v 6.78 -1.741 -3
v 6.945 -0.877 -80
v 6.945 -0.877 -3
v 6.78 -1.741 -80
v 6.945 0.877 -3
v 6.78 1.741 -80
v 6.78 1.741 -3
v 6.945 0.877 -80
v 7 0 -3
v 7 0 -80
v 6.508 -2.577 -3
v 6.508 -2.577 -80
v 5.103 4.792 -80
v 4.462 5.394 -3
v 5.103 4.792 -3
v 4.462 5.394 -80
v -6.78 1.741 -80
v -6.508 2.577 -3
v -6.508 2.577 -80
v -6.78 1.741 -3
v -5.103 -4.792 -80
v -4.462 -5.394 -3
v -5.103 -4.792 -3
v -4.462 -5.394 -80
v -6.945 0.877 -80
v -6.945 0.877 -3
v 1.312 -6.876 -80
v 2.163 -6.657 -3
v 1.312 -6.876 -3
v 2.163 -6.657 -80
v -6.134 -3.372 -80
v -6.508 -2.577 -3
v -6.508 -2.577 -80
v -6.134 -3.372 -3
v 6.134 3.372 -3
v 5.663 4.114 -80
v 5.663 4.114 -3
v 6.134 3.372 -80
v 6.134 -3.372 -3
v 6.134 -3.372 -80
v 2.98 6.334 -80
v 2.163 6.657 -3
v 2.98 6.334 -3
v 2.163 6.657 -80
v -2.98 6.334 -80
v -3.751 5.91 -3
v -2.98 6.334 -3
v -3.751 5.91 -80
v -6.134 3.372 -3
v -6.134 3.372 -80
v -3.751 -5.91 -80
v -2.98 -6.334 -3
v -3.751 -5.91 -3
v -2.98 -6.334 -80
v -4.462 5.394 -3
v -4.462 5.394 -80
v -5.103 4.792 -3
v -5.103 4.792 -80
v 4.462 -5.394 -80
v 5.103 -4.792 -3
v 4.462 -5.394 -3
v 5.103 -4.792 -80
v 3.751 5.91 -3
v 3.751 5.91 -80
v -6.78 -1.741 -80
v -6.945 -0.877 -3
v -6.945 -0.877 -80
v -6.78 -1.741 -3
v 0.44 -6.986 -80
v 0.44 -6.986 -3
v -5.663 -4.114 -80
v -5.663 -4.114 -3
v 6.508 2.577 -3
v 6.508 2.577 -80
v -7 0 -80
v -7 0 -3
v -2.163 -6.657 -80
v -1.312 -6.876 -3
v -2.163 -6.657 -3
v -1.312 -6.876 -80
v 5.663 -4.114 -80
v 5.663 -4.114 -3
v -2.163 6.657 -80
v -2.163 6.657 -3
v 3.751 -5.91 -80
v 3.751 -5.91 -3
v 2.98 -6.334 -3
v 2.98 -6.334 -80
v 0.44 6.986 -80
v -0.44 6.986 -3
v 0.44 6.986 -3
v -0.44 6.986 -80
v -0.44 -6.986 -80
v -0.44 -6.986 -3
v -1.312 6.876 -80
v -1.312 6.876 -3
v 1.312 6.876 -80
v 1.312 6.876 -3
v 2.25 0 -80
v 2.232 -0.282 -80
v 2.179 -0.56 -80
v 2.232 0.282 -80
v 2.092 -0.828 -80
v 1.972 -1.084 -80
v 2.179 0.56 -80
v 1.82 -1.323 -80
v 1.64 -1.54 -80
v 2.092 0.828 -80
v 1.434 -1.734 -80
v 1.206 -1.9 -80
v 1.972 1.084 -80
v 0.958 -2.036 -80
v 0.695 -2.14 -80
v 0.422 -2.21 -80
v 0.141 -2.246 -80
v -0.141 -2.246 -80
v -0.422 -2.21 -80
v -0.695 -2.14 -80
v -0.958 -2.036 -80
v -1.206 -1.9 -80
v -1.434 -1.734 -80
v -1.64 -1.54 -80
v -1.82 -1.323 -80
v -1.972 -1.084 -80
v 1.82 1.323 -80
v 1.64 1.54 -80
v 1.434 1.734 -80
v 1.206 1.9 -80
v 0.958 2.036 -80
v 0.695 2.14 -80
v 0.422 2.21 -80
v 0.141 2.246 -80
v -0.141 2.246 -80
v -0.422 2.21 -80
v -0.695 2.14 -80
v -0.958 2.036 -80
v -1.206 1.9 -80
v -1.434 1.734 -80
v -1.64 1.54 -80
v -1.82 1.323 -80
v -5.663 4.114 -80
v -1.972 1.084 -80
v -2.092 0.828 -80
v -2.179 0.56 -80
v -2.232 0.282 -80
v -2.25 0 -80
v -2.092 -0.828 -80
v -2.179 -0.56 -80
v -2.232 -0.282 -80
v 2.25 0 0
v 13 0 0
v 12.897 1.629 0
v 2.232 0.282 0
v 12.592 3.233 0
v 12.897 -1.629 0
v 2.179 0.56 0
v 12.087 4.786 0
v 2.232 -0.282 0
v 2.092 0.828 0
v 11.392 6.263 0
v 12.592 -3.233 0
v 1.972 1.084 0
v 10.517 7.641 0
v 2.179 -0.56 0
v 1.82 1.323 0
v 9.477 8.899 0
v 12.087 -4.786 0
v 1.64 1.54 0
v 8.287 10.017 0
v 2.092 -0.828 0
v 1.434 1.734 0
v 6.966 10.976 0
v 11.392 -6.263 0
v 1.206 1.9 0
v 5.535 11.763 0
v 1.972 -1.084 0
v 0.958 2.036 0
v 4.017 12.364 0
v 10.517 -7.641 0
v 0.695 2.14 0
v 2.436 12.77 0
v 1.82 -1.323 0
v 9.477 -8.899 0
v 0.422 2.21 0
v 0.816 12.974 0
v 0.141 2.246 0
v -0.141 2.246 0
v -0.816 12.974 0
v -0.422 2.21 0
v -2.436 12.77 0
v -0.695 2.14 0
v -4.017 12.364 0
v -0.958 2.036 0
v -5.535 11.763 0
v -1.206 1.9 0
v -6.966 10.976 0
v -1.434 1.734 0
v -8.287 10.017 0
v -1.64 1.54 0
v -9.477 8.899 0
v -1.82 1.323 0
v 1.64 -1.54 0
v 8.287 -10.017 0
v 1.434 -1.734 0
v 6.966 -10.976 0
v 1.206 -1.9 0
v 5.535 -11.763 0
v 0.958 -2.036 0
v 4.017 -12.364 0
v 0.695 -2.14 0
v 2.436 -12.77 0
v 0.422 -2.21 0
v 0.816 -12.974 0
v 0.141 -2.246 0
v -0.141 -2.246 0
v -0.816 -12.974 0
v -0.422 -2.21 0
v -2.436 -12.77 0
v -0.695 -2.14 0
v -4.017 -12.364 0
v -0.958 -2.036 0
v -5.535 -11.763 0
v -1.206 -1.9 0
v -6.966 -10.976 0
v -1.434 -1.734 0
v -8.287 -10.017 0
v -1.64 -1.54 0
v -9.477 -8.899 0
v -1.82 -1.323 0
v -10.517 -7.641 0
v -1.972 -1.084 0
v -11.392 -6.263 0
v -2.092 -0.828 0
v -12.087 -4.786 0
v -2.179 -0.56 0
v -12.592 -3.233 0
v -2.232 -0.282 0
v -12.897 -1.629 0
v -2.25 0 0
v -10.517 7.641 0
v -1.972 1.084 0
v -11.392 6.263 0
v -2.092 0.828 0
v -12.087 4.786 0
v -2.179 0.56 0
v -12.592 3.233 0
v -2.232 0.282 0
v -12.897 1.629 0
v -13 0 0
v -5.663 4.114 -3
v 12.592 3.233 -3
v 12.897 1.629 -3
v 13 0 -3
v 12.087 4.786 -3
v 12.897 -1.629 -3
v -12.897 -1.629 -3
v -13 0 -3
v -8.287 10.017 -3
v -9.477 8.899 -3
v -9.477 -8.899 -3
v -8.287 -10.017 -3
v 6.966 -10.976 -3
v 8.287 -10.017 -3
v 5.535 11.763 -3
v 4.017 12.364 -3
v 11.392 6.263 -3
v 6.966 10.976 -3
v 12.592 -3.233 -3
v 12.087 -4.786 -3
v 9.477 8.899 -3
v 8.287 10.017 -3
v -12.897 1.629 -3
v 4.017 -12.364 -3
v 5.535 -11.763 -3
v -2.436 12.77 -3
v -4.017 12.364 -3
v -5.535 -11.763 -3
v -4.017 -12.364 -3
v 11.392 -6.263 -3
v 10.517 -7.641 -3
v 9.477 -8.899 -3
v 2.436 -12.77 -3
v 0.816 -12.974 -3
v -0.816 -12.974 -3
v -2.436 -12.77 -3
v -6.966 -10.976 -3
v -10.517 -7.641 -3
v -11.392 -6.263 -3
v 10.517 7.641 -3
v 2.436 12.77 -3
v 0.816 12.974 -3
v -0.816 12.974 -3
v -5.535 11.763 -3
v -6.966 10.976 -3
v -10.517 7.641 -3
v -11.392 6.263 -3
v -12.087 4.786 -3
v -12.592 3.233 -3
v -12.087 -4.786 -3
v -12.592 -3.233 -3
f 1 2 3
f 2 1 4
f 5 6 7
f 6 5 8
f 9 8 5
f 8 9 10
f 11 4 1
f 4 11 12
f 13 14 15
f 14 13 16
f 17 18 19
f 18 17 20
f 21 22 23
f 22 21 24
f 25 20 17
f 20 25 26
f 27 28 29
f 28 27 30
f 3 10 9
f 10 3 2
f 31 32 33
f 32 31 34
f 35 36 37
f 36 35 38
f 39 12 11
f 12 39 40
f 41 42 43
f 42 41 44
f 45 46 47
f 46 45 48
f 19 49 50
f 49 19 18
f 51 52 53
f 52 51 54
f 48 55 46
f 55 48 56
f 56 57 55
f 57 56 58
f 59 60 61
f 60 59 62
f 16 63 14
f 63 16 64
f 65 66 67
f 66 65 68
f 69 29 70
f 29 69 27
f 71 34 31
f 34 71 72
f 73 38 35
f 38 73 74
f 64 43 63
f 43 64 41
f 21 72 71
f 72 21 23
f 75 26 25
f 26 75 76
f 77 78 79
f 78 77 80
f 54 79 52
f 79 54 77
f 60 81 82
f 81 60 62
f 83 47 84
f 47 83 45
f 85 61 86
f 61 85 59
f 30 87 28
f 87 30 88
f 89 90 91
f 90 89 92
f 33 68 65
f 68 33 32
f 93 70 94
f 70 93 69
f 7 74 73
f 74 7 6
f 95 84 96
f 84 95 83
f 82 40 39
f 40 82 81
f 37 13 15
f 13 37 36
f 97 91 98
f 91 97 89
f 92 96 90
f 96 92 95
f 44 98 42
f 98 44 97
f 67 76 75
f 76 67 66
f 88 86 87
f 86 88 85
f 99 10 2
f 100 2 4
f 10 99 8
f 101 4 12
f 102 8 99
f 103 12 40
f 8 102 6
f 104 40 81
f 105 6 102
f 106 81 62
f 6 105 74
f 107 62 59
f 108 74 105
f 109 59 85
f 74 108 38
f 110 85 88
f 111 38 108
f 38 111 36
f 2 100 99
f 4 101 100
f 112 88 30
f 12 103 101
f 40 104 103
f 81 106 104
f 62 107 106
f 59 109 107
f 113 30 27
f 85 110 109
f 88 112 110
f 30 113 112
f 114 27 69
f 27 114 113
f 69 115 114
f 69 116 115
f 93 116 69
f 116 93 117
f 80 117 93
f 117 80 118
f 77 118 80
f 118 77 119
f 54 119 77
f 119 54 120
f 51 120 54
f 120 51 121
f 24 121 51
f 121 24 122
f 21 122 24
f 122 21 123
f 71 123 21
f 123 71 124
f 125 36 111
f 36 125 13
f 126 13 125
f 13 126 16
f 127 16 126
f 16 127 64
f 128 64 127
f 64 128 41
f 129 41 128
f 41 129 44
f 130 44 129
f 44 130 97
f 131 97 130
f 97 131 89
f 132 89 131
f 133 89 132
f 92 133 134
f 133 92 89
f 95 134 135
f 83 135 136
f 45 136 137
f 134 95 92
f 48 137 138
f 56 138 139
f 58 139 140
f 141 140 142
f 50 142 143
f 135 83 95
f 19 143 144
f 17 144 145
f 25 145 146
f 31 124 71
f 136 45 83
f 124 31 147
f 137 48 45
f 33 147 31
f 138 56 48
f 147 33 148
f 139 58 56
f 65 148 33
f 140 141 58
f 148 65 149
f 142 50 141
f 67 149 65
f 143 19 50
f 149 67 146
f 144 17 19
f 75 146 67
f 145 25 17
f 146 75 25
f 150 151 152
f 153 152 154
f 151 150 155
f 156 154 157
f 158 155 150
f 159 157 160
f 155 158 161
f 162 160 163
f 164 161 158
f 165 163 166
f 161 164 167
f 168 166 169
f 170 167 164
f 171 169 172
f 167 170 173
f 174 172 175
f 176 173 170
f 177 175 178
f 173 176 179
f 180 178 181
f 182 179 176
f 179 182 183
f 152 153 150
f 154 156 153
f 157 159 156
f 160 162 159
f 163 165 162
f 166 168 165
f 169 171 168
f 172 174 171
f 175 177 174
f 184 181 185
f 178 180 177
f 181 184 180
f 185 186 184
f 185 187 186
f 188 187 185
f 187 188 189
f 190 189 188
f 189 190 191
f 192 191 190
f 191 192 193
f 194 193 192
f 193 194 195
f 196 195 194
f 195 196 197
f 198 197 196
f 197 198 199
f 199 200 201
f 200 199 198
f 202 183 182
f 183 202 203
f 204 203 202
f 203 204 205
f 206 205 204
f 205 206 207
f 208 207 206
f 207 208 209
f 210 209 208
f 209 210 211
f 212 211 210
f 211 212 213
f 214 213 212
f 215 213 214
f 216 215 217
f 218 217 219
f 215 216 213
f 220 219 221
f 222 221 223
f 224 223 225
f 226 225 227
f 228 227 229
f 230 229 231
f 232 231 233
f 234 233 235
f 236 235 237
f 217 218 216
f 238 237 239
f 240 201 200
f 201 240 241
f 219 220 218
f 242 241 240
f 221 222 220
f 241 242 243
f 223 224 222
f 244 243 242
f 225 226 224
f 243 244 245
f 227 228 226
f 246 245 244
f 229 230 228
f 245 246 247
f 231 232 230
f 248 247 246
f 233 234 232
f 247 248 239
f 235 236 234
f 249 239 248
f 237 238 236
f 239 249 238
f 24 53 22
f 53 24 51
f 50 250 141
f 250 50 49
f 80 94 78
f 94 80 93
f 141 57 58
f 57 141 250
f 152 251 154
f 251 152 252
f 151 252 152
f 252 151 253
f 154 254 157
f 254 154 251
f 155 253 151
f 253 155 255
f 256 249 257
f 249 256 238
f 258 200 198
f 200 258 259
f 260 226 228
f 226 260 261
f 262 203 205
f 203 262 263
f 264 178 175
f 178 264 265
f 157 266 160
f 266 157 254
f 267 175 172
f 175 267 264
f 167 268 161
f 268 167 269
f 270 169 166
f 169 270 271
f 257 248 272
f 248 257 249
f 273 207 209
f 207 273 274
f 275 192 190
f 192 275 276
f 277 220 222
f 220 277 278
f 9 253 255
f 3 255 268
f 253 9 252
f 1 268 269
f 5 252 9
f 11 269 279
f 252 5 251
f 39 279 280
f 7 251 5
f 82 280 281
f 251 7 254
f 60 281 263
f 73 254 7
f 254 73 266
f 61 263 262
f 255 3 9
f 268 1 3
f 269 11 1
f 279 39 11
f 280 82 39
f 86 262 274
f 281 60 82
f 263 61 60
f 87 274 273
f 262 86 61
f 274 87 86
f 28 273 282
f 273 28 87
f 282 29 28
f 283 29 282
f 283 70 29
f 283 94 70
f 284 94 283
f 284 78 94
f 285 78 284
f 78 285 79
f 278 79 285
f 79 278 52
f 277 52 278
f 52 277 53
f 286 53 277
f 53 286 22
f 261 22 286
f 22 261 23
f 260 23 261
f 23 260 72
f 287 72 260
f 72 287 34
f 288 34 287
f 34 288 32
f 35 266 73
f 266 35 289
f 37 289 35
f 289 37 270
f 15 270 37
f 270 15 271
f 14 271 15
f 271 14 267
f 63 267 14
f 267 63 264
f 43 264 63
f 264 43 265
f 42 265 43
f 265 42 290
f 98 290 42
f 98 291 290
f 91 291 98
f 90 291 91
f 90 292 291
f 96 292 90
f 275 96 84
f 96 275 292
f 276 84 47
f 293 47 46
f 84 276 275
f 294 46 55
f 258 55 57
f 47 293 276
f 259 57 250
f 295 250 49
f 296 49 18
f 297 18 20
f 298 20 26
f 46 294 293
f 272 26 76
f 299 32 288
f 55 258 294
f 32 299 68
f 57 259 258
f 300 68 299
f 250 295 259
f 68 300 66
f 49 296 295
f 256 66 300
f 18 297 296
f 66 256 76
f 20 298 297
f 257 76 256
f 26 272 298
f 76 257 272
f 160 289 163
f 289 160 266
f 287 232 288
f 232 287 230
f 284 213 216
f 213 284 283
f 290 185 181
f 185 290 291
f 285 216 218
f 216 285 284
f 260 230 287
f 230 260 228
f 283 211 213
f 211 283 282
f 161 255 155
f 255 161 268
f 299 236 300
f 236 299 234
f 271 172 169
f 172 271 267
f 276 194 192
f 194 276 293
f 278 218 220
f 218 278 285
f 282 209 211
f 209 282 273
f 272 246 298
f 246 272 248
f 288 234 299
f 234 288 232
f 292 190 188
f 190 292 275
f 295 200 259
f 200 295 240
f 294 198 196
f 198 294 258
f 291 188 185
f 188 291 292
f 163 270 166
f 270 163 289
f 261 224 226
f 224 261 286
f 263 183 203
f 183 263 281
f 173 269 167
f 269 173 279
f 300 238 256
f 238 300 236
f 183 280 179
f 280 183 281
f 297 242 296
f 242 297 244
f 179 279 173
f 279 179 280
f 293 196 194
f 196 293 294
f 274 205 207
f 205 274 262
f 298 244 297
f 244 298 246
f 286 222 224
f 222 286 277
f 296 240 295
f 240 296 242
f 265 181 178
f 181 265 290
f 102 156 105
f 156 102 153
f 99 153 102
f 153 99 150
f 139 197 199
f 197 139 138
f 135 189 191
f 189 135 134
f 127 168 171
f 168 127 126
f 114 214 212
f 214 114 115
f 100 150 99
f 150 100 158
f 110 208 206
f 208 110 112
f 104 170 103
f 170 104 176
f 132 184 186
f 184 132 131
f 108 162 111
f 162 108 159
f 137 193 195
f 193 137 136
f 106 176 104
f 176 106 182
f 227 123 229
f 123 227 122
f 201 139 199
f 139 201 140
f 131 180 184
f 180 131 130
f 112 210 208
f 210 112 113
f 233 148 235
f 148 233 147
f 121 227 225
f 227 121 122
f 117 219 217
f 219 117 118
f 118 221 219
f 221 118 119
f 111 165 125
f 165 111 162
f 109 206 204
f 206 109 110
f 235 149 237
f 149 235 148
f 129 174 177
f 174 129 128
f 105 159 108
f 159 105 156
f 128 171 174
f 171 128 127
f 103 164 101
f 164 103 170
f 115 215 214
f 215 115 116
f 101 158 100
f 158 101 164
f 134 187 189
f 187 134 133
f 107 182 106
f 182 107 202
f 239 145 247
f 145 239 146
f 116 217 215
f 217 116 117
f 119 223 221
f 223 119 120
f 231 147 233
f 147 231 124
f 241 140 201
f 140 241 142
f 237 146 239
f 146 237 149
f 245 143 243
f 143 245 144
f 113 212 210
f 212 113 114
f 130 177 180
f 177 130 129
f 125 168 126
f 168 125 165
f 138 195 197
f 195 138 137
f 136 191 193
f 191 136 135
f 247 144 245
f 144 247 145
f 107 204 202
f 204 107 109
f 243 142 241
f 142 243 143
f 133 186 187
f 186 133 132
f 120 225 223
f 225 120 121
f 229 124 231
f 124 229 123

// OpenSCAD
$fn = 50;


difference() {
	union() {
		translate(v = [0, 0, -80.0000000000]) {
			cylinder(h = 80, r = 7.0000000000);
		}
		translate(v = [0, 0, -3.0000000000]) {
			cylinder(h = 3, r = 13.0000000000);
		}
	}
	union() {
		#translate(v = [0, 0, -80]) {
			cylinder(h = 80, r = 2.2500000000);
		}
	}
}
